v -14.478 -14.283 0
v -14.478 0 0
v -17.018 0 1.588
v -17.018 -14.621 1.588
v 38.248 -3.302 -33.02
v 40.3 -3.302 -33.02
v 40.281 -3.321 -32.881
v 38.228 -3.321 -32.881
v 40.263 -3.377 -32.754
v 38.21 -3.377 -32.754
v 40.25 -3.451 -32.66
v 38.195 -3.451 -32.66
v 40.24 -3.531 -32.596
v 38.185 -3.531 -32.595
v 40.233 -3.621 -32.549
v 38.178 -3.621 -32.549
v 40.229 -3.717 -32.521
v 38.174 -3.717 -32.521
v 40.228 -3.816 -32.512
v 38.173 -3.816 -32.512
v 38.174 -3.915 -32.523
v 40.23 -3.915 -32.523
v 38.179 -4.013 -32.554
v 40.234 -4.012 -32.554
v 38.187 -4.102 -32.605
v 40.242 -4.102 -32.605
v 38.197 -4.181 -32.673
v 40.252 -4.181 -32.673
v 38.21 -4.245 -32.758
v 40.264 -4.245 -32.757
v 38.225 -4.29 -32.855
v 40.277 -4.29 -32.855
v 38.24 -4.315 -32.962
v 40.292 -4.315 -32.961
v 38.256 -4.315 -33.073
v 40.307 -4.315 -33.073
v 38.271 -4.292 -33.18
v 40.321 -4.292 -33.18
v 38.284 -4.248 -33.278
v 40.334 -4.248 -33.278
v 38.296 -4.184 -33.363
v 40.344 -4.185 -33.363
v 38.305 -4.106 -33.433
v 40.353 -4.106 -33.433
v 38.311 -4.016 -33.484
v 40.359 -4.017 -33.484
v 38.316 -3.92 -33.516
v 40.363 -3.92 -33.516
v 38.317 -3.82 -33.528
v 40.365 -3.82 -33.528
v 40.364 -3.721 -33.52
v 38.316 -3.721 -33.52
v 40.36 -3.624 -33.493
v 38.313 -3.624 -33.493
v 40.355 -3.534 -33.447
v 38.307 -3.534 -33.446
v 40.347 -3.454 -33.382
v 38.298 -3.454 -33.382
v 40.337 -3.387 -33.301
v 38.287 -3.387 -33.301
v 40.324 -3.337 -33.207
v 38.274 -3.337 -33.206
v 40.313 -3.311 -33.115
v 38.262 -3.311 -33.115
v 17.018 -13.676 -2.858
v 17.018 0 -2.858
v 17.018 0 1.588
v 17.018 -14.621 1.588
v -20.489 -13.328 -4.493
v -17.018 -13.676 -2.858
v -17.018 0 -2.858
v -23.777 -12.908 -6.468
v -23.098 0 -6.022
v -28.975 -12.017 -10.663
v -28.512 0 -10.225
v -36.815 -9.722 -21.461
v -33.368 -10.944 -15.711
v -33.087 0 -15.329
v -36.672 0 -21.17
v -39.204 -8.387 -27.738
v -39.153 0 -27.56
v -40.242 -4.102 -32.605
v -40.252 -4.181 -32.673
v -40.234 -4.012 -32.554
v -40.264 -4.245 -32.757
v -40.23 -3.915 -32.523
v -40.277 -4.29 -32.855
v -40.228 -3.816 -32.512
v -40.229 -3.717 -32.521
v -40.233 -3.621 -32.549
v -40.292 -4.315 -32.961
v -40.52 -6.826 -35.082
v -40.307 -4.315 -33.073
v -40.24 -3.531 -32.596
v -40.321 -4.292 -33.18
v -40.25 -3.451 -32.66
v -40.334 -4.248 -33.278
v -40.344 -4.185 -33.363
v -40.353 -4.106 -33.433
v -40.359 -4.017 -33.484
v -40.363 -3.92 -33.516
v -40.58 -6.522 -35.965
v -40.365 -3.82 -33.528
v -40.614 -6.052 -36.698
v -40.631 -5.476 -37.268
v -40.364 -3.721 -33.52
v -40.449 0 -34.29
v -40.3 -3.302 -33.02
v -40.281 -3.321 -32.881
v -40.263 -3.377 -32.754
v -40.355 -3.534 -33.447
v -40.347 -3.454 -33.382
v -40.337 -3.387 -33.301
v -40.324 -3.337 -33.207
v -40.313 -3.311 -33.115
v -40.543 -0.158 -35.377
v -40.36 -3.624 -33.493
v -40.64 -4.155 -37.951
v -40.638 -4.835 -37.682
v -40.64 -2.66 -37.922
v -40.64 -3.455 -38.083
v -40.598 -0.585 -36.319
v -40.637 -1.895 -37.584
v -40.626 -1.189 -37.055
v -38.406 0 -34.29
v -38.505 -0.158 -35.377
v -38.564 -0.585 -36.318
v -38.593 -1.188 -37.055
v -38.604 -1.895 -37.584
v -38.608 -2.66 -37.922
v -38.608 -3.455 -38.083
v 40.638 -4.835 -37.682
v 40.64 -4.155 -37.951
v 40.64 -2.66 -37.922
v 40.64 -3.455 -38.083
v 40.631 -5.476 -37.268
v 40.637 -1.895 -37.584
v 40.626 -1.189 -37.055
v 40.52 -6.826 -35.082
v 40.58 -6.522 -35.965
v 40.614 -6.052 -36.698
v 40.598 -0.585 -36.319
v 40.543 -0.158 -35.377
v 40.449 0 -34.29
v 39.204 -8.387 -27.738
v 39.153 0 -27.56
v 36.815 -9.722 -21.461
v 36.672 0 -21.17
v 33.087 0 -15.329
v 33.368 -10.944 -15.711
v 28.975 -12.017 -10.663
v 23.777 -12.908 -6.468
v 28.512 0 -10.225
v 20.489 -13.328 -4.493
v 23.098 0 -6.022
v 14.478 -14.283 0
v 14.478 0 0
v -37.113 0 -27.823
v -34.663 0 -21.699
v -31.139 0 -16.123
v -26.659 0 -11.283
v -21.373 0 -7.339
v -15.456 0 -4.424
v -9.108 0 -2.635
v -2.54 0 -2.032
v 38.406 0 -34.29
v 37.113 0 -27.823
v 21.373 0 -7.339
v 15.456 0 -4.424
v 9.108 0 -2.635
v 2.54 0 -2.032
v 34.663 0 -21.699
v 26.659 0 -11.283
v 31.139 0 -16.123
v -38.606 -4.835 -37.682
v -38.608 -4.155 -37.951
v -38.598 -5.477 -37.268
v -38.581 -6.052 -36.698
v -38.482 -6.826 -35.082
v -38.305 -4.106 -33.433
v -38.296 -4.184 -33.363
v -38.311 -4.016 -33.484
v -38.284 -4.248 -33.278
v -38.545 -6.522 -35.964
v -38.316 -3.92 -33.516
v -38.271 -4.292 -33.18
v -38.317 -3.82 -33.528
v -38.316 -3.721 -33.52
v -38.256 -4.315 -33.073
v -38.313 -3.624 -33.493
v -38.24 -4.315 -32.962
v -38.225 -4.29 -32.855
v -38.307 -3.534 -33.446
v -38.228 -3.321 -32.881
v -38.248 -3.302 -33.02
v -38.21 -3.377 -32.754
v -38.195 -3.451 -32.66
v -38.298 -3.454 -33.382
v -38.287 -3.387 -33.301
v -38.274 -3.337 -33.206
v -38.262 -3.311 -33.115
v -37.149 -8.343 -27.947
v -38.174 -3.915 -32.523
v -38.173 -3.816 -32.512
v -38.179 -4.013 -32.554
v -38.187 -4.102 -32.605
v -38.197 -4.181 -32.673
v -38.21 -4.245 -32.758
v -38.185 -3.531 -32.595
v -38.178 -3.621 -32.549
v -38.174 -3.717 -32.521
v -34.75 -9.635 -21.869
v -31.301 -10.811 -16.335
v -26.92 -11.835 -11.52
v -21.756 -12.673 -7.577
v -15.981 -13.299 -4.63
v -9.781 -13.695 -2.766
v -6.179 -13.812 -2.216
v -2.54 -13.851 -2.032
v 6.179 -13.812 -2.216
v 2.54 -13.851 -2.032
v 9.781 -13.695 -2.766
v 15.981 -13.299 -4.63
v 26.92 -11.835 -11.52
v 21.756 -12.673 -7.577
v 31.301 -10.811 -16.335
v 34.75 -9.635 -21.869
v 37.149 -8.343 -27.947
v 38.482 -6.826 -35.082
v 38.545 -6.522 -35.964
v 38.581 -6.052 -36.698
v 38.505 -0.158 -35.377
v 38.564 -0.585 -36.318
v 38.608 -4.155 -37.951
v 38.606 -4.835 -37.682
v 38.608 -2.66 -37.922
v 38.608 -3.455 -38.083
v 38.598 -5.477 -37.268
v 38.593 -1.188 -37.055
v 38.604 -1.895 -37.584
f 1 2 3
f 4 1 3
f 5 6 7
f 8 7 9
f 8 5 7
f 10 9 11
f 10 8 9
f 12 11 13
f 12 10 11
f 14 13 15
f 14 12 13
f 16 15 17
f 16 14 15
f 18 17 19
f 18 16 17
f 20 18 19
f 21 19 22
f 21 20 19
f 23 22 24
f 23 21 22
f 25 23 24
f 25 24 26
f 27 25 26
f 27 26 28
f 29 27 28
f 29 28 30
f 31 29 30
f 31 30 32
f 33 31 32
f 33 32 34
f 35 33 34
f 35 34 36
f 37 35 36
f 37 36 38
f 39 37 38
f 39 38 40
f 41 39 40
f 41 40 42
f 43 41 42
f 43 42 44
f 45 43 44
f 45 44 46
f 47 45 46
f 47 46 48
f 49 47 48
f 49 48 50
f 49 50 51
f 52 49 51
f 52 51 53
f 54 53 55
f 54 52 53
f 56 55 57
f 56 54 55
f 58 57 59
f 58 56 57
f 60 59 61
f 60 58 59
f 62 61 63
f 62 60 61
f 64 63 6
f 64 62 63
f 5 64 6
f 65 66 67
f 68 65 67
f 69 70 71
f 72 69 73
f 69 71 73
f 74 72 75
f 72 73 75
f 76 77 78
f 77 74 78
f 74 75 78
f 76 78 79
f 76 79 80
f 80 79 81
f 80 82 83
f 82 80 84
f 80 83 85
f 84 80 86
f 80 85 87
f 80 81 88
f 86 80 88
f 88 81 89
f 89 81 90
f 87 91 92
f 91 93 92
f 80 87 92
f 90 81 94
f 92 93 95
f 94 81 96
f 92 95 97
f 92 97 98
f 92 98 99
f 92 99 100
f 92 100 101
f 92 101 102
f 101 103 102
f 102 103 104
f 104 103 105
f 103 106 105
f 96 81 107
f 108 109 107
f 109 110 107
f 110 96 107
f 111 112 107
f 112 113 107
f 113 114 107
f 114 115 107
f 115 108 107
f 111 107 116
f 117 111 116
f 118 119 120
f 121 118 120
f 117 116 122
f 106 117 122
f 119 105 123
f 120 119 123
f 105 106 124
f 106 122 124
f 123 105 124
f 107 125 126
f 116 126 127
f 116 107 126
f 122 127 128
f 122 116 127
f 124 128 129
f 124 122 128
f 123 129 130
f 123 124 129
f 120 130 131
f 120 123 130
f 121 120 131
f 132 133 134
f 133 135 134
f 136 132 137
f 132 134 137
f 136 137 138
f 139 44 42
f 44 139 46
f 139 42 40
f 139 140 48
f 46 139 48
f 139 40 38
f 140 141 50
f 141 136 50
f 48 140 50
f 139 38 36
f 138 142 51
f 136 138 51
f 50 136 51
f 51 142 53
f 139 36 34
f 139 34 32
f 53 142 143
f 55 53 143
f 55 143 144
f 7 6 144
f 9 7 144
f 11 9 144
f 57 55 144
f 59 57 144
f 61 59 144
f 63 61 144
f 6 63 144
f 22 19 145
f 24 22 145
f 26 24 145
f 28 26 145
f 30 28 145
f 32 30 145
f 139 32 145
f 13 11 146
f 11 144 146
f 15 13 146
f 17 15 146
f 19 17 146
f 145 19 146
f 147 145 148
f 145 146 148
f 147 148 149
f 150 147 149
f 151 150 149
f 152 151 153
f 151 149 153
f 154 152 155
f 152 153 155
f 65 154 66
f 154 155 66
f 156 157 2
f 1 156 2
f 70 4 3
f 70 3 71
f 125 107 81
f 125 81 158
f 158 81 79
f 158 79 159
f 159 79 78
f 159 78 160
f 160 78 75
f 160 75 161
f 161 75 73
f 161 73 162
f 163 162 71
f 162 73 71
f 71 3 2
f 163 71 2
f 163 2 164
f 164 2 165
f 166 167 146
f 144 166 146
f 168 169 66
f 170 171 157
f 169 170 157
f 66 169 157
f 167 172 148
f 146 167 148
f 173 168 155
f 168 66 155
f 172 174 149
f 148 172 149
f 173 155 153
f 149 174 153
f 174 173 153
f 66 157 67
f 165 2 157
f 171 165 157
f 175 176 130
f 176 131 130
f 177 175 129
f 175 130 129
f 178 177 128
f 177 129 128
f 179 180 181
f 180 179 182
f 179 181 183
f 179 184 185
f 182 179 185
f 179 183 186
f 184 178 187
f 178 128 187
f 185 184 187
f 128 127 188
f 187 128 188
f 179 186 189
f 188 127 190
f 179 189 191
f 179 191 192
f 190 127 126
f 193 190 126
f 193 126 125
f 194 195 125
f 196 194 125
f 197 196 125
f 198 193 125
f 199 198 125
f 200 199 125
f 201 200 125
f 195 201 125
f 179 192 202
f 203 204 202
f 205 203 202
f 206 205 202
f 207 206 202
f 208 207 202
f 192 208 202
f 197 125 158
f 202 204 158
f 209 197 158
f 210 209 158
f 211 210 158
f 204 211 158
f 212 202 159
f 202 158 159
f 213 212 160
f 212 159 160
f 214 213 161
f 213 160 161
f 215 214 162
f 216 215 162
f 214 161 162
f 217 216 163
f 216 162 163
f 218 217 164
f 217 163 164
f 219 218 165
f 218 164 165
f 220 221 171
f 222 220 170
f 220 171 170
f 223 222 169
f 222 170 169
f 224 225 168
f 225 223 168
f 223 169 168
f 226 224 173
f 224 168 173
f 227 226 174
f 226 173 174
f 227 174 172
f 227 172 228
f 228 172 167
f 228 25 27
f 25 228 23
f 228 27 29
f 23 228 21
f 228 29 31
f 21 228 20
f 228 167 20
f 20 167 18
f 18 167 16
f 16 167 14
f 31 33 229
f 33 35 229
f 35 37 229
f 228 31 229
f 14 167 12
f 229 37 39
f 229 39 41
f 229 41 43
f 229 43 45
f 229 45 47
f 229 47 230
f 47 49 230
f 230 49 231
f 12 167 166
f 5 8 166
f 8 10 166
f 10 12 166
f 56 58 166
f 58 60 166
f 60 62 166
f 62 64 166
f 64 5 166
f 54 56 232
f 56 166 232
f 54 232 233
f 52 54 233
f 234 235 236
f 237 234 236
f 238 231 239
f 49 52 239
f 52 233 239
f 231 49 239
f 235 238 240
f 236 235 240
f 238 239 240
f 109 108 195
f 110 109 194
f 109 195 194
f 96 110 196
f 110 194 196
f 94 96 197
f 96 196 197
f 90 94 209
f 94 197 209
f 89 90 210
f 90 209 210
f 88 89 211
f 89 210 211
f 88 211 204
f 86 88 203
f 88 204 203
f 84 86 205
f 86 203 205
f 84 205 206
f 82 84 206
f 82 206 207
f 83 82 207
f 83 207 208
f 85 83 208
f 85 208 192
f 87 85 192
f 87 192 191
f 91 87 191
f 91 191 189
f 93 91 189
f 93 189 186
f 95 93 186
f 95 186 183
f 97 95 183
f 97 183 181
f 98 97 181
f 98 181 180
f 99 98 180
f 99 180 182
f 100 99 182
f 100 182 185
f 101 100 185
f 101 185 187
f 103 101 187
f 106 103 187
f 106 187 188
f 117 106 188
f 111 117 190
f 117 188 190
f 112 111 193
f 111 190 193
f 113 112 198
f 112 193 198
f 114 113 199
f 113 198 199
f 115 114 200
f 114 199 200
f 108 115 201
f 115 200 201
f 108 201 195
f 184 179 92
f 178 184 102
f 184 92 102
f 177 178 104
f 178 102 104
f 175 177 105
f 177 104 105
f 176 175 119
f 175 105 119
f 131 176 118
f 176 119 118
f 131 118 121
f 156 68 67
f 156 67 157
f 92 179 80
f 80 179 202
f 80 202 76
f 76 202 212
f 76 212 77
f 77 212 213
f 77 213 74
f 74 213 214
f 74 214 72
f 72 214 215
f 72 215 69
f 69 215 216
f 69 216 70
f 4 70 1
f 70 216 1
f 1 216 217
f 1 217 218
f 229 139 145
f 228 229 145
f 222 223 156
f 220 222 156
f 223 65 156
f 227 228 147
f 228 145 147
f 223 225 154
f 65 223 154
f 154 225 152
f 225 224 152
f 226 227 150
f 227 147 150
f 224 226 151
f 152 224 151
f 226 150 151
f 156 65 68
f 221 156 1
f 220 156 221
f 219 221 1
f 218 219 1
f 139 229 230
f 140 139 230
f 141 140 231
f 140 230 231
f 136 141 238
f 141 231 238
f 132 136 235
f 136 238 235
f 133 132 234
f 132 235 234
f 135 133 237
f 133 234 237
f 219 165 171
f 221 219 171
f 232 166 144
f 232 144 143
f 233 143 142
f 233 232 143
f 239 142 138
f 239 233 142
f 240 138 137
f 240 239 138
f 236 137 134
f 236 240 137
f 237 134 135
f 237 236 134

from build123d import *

# Parameters (mm, degrees)
F1_DEPTH      = 25.4
F3_DEPTH      = 40.641
F3_DEPTH_BACK = 40.641
F4_R          = 0.508
F5_DEPTH      = 40.641
F5_DEPTH_BACK = 40.641
F6_T1_DEPTH   = 17.4583858324
F6_T3_DEPTH   = 21.082
F6_T5_DEPTH   = 21.082
F6_T7_DEPTH   = 17.4583858324


# Not quite as in the source:
# - a fillet or chamfer that OpenCascade refuses, or shapes differently, is made with other operations: its cross-section is extruded or revolved along the edge and cut away or added


with BuildPart() as f1:
    # F0 (on Front) → F1 (new body)
    with BuildSketch(Plane.XZ):
        with BuildLine():
            Line((2.54, 0), (0, 0))
            Line((0, 0), (-2.54, 0))
            Line((-2.54, 0), (-14.478, 0))
            Line((-14.478, 0), (-17.018, 0))
            Line((-17.018, 0), (-17.018, -2.8580148686))
            ThreePointArc((-17.018, -2.8580148686), (-34.1882369177, -16.8868177776), (-40.64, -38.1))
            Line((-40.64, -38.1), (-38.608, -38.1))
            ThreePointArc((-38.608, -38.1), (-28.0439273838, -12.5960726162), (-2.54, -2.032))
            Line((-2.54, -2.032), (0, -2.032))
            Line((0, -2.032), (2.54, -2.032))
            ThreePointArc((2.54, -2.032), (28.0439273838, -12.5960726162), (38.608, -38.1))
            Line((38.608, -38.1), (40.64, -38.1))
            ThreePointArc((40.64, -38.1), (34.1882369177, -16.8868177776), (17.018, -2.8580148686))
            Line((17.018, -2.8580148686), (17.018, 0))
            Line((17.018, 0), (14.478, 0))
            Line((14.478, 0), (2.54, 0))
        make_face()
        Polygon((-17.018, 0), (-14.478, 0), (-17.018, 1.5875), align=None)
        Polygon((17.018, 1.5875), (14.478, 0), (17.018, 0), align=None)
    extrude(amount=F1_DEPTH)

    # F2 (on Right) → F3 (cut, two sides)
    with BuildSketch(Plane.YZ) as f3_sk:
        Polygon((-30.48, -50.8), (-3.4853166679, -50.8), (-30.48, 76.2), align=None)
    extrude(amount=-F3_DEPTH, mode=Mode.SUBTRACT)
    extrude(f3_sk.sketch, amount=F3_DEPTH_BACK, mode=Mode.SUBTRACT)

    # F4 (on Right) → F5 (cut, two sides)
    with BuildSketch(Plane.YZ) as f5_sk:
        with Locations((-3.81, -33.02)):
            Circle(F4_R)
    extrude(amount=-F5_DEPTH, mode=Mode.SUBTRACT)
    extrude(f5_sk.sketch, amount=F5_DEPTH_BACK, mode=Mode.SUBTRACT)

    # F6: fillet of radius 3.81 on 4 edges, made by hand

    # F6_s2 → F6_t1 (cut)
    with BuildSketch(Plane.YZ.offset(30.8948070838)):
        with BuildLine():
            ThreePointArc((-6.8262501934, -35.082143542), (-5.4972185245, -37.2509261132), (-3.0995078346, -38.1))
            Line((-3.0995078346, -38.1), (-6.1847850011, -38.1))
            Line((-6.1847850011, -38.1), (-6.8262501934, -35.082143542))
        make_face()
    extrude(amount=F6_T1_DEPTH, mode=Mode.SUBTRACT)

    # F6_s4 → F6_t3 (cut)
    with BuildSketch(Plane.YZ.offset(29.083)):
        with BuildLine():
            ThreePointArc((0, -34.29), (-1.1159231637, -36.9840768363), (-3.81, -38.1))
            Line((-3.81, -38.1), (0, -38.1))
            Line((0, -38.1), (0, -34.29))
        make_face()
    extrude(amount=F6_T3_DEPTH, mode=Mode.SUBTRACT)

    # F6_s6 → F6_t5 (cut)
    with BuildSketch(Plane.YZ.offset(-50.165)):
        with BuildLine():
            ThreePointArc((0, -34.29), (-1.1159231637, -36.9840768363), (-3.81, -38.1))
            Line((-3.81, -38.1), (0, -38.1))
            Line((0, -38.1), (0, -34.29))
        make_face()
    extrude(amount=F6_T5_DEPTH, mode=Mode.SUBTRACT)

    # F6_s8 → F6_t7 (cut)
    with BuildSketch(Plane.YZ.offset(-48.3531929162)):
        with BuildLine():
            ThreePointArc((-6.8262501934, -35.082143542), (-5.4972185245, -37.2509261132), (-3.0995078346, -38.1))
            Line((-3.0995078346, -38.1), (-6.1847850011, -38.1))
            Line((-6.1847850011, -38.1), (-6.8262501934, -35.082143542))
        make_face()
    extrude(amount=F6_T7_DEPTH, mode=Mode.SUBTRACT)


solid = f1.part
